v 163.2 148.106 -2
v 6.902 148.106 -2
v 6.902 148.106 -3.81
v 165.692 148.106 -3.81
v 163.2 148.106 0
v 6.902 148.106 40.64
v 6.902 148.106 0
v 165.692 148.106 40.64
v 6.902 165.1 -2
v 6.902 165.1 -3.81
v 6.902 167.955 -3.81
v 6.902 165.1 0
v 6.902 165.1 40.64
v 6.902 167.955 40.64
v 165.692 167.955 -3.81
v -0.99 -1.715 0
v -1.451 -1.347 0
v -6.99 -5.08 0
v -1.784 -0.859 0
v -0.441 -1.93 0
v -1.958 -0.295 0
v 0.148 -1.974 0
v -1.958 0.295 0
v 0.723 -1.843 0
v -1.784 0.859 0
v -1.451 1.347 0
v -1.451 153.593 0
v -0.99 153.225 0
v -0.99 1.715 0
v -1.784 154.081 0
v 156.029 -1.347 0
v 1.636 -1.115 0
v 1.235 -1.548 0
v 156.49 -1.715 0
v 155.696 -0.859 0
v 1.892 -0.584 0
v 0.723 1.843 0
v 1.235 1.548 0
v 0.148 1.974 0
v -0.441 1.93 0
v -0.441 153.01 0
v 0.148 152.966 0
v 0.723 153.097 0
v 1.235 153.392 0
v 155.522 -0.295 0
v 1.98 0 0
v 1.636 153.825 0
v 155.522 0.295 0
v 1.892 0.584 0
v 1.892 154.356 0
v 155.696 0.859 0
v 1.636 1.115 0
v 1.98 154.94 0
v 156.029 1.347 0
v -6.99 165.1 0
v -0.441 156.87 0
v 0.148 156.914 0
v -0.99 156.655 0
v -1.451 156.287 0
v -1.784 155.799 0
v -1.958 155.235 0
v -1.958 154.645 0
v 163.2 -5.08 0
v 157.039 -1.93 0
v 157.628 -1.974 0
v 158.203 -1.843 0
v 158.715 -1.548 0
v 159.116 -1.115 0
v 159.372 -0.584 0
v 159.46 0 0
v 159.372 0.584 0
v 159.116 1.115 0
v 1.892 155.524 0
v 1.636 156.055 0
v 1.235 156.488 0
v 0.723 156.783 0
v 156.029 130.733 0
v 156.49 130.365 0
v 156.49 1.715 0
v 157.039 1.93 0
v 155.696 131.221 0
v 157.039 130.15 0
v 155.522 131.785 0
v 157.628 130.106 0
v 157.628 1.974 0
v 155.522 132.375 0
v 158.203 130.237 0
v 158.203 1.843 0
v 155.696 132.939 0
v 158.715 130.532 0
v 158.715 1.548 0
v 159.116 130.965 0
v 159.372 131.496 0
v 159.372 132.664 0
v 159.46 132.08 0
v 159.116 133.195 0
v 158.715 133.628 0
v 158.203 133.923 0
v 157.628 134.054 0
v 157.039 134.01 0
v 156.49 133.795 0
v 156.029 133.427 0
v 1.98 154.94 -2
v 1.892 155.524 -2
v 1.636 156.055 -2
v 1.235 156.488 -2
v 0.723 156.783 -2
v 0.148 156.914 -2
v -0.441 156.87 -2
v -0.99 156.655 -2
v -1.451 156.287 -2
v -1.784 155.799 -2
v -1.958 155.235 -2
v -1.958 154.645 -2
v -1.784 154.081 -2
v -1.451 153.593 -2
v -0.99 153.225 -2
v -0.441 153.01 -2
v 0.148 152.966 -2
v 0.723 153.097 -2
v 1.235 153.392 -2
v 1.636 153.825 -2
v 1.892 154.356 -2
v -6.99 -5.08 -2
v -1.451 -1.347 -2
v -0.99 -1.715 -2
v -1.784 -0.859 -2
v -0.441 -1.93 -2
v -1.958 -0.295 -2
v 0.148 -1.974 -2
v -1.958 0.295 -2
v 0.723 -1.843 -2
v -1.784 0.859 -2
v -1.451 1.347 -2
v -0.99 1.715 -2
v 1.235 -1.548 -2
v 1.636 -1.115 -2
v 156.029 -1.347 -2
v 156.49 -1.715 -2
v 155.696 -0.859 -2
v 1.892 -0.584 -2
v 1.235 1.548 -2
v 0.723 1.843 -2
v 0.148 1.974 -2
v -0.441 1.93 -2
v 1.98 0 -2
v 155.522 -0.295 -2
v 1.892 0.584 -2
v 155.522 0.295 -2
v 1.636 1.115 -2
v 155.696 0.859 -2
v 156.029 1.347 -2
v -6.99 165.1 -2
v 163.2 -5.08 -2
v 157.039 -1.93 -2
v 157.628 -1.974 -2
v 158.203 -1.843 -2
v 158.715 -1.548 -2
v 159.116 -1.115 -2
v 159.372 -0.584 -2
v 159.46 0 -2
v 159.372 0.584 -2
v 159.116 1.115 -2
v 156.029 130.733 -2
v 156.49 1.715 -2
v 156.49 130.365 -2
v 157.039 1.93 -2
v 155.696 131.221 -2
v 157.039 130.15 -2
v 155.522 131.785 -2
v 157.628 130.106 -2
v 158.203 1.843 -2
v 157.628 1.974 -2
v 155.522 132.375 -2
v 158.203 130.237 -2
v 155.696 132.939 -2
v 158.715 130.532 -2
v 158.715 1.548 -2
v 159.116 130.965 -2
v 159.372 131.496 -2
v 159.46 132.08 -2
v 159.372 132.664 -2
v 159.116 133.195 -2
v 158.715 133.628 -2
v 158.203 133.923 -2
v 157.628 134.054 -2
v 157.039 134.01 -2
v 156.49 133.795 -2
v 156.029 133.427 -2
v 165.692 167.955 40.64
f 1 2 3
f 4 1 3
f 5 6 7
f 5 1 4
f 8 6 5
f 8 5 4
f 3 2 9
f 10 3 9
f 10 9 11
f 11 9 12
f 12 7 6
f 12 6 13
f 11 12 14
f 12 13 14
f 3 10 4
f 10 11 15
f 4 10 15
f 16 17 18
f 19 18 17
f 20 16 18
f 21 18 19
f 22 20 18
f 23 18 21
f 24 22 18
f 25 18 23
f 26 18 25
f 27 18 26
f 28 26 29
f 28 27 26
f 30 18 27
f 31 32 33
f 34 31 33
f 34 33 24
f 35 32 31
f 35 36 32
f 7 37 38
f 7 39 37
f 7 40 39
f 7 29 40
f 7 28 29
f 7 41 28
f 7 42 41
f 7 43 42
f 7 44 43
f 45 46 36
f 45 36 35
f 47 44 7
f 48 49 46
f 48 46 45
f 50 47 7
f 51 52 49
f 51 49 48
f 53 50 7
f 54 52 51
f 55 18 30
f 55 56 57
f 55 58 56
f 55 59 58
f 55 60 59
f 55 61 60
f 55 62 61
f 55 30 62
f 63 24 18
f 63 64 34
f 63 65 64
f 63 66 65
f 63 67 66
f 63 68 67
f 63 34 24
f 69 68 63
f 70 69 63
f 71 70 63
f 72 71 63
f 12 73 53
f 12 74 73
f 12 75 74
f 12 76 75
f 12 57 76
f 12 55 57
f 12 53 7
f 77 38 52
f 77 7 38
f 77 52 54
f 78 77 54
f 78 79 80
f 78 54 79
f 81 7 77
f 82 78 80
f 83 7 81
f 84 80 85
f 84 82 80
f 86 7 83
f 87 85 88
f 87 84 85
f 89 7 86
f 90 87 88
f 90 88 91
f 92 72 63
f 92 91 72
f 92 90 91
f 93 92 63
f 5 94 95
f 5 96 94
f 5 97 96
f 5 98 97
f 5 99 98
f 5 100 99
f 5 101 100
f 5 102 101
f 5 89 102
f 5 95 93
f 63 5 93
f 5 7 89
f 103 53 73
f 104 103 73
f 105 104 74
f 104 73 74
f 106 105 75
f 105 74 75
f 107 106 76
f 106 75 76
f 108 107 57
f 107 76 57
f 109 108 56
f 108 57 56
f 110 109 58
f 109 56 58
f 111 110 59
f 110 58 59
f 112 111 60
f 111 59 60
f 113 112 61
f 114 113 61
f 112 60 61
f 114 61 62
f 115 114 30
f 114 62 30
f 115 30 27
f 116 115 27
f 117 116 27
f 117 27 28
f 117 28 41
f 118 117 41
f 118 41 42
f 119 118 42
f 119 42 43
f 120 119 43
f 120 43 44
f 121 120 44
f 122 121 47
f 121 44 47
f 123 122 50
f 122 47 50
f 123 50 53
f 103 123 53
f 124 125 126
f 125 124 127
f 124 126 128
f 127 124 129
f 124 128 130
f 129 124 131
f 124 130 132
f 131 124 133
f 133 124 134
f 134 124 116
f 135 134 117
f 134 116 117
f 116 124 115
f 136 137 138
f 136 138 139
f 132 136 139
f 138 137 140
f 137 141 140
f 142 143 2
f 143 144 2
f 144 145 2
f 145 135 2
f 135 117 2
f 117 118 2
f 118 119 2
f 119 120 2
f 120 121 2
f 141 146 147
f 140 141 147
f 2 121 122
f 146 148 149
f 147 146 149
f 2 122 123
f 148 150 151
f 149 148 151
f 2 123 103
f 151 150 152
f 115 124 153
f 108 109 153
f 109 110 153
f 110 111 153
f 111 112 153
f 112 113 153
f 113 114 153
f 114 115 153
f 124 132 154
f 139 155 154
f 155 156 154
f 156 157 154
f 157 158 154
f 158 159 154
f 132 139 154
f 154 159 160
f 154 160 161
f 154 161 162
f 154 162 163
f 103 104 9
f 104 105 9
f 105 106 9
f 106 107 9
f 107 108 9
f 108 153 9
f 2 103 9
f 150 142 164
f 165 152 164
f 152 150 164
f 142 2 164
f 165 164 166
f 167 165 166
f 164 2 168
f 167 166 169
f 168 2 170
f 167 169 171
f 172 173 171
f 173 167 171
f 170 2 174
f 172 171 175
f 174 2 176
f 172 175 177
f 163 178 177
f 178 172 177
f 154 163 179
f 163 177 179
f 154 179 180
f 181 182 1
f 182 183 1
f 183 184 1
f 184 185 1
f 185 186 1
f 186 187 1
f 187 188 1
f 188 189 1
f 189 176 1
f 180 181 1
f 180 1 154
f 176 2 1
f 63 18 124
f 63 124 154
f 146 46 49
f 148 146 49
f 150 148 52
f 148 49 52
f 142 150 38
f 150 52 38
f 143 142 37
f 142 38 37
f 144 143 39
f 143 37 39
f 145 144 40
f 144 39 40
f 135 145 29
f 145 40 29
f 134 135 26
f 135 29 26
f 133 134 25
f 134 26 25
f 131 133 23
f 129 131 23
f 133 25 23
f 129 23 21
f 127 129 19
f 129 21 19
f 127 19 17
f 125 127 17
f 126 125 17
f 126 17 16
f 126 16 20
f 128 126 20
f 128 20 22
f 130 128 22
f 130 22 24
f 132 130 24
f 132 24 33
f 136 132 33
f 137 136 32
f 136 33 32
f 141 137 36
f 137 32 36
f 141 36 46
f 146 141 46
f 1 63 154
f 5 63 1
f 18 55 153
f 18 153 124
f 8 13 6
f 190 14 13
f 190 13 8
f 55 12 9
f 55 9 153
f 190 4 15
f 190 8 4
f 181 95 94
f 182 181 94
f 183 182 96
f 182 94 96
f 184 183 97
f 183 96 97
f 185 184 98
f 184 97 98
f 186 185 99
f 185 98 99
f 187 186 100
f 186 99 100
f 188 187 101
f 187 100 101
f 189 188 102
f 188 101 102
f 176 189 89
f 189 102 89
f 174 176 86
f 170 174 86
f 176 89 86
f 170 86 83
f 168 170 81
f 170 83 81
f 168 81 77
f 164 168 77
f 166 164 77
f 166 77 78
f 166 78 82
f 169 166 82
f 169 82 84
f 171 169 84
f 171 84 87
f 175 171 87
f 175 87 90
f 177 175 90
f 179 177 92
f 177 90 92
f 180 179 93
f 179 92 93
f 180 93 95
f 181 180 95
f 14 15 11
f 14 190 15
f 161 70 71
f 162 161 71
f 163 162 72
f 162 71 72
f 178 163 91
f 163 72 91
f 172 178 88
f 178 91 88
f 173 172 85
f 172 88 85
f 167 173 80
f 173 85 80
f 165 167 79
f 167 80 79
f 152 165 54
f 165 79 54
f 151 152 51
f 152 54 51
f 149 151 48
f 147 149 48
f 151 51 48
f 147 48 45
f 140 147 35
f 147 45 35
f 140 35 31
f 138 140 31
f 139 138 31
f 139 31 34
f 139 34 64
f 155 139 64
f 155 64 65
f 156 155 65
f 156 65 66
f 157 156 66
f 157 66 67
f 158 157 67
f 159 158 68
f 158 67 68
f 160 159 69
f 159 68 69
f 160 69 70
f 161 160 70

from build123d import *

# Parameters (mm, degrees)
F0_R     = 1.98
F0_W     = 156.2984559469
F0_H     = 16.9940508366
F1_DEPTH = 2
F2_DEPTH = 3.81
F3_DEPTH = 44.45


with BuildPart() as f1:
    # F0 (on Top) → F1 (new body)
    with BuildSketch(Plane.XY):
        Polygon((-6.99, 165.1), (-6.99, -5.08), (163.2, -5.08), (163.2, 148.1059491634), (6.9015440531, 148.1059491634), (6.9015440531, 165.1), align=None)
        Circle(F0_R, mode=Mode.SUBTRACT)
        with Locations((157.48, 0)):
            Circle(F0_R, mode=Mode.SUBTRACT)
        with Locations((0, 154.94)):
            Circle(F0_R, mode=Mode.SUBTRACT)
        with Locations((157.48, 132.08)):
            Circle(F0_R, mode=Mode.SUBTRACT)
        with Locations((85.0507720266, 156.6029745817)):
            Rectangle(F0_W, F0_H)
    extrude(amount=-F1_DEPTH)

    # F0 (on Top) → F2 (join)
    with BuildSketch(Plane.XY):
        with Locations((85.0507720266, 156.6029745817)):
            Rectangle(F0_W, F0_H)
        Polygon((163.2, 165.1), (163.2, 148.1059491634), (165.6916588545, 148.1059491634), (165.6916588545, 167.9547131062), (6.9015440531, 167.9547131062), (6.9015440531, 165.1), align=None)
    extrude(amount=-F2_DEPTH)

    # F3 (add): a face of the model
    f3_faces = [f1.faces().sort_by_distance(p)[0] for p in [
        (86.2966014538, 158.0303311348, -3.81),
    ]]
    extrude(f3_faces, amount=-F3_DEPTH)


solid = f1.part
